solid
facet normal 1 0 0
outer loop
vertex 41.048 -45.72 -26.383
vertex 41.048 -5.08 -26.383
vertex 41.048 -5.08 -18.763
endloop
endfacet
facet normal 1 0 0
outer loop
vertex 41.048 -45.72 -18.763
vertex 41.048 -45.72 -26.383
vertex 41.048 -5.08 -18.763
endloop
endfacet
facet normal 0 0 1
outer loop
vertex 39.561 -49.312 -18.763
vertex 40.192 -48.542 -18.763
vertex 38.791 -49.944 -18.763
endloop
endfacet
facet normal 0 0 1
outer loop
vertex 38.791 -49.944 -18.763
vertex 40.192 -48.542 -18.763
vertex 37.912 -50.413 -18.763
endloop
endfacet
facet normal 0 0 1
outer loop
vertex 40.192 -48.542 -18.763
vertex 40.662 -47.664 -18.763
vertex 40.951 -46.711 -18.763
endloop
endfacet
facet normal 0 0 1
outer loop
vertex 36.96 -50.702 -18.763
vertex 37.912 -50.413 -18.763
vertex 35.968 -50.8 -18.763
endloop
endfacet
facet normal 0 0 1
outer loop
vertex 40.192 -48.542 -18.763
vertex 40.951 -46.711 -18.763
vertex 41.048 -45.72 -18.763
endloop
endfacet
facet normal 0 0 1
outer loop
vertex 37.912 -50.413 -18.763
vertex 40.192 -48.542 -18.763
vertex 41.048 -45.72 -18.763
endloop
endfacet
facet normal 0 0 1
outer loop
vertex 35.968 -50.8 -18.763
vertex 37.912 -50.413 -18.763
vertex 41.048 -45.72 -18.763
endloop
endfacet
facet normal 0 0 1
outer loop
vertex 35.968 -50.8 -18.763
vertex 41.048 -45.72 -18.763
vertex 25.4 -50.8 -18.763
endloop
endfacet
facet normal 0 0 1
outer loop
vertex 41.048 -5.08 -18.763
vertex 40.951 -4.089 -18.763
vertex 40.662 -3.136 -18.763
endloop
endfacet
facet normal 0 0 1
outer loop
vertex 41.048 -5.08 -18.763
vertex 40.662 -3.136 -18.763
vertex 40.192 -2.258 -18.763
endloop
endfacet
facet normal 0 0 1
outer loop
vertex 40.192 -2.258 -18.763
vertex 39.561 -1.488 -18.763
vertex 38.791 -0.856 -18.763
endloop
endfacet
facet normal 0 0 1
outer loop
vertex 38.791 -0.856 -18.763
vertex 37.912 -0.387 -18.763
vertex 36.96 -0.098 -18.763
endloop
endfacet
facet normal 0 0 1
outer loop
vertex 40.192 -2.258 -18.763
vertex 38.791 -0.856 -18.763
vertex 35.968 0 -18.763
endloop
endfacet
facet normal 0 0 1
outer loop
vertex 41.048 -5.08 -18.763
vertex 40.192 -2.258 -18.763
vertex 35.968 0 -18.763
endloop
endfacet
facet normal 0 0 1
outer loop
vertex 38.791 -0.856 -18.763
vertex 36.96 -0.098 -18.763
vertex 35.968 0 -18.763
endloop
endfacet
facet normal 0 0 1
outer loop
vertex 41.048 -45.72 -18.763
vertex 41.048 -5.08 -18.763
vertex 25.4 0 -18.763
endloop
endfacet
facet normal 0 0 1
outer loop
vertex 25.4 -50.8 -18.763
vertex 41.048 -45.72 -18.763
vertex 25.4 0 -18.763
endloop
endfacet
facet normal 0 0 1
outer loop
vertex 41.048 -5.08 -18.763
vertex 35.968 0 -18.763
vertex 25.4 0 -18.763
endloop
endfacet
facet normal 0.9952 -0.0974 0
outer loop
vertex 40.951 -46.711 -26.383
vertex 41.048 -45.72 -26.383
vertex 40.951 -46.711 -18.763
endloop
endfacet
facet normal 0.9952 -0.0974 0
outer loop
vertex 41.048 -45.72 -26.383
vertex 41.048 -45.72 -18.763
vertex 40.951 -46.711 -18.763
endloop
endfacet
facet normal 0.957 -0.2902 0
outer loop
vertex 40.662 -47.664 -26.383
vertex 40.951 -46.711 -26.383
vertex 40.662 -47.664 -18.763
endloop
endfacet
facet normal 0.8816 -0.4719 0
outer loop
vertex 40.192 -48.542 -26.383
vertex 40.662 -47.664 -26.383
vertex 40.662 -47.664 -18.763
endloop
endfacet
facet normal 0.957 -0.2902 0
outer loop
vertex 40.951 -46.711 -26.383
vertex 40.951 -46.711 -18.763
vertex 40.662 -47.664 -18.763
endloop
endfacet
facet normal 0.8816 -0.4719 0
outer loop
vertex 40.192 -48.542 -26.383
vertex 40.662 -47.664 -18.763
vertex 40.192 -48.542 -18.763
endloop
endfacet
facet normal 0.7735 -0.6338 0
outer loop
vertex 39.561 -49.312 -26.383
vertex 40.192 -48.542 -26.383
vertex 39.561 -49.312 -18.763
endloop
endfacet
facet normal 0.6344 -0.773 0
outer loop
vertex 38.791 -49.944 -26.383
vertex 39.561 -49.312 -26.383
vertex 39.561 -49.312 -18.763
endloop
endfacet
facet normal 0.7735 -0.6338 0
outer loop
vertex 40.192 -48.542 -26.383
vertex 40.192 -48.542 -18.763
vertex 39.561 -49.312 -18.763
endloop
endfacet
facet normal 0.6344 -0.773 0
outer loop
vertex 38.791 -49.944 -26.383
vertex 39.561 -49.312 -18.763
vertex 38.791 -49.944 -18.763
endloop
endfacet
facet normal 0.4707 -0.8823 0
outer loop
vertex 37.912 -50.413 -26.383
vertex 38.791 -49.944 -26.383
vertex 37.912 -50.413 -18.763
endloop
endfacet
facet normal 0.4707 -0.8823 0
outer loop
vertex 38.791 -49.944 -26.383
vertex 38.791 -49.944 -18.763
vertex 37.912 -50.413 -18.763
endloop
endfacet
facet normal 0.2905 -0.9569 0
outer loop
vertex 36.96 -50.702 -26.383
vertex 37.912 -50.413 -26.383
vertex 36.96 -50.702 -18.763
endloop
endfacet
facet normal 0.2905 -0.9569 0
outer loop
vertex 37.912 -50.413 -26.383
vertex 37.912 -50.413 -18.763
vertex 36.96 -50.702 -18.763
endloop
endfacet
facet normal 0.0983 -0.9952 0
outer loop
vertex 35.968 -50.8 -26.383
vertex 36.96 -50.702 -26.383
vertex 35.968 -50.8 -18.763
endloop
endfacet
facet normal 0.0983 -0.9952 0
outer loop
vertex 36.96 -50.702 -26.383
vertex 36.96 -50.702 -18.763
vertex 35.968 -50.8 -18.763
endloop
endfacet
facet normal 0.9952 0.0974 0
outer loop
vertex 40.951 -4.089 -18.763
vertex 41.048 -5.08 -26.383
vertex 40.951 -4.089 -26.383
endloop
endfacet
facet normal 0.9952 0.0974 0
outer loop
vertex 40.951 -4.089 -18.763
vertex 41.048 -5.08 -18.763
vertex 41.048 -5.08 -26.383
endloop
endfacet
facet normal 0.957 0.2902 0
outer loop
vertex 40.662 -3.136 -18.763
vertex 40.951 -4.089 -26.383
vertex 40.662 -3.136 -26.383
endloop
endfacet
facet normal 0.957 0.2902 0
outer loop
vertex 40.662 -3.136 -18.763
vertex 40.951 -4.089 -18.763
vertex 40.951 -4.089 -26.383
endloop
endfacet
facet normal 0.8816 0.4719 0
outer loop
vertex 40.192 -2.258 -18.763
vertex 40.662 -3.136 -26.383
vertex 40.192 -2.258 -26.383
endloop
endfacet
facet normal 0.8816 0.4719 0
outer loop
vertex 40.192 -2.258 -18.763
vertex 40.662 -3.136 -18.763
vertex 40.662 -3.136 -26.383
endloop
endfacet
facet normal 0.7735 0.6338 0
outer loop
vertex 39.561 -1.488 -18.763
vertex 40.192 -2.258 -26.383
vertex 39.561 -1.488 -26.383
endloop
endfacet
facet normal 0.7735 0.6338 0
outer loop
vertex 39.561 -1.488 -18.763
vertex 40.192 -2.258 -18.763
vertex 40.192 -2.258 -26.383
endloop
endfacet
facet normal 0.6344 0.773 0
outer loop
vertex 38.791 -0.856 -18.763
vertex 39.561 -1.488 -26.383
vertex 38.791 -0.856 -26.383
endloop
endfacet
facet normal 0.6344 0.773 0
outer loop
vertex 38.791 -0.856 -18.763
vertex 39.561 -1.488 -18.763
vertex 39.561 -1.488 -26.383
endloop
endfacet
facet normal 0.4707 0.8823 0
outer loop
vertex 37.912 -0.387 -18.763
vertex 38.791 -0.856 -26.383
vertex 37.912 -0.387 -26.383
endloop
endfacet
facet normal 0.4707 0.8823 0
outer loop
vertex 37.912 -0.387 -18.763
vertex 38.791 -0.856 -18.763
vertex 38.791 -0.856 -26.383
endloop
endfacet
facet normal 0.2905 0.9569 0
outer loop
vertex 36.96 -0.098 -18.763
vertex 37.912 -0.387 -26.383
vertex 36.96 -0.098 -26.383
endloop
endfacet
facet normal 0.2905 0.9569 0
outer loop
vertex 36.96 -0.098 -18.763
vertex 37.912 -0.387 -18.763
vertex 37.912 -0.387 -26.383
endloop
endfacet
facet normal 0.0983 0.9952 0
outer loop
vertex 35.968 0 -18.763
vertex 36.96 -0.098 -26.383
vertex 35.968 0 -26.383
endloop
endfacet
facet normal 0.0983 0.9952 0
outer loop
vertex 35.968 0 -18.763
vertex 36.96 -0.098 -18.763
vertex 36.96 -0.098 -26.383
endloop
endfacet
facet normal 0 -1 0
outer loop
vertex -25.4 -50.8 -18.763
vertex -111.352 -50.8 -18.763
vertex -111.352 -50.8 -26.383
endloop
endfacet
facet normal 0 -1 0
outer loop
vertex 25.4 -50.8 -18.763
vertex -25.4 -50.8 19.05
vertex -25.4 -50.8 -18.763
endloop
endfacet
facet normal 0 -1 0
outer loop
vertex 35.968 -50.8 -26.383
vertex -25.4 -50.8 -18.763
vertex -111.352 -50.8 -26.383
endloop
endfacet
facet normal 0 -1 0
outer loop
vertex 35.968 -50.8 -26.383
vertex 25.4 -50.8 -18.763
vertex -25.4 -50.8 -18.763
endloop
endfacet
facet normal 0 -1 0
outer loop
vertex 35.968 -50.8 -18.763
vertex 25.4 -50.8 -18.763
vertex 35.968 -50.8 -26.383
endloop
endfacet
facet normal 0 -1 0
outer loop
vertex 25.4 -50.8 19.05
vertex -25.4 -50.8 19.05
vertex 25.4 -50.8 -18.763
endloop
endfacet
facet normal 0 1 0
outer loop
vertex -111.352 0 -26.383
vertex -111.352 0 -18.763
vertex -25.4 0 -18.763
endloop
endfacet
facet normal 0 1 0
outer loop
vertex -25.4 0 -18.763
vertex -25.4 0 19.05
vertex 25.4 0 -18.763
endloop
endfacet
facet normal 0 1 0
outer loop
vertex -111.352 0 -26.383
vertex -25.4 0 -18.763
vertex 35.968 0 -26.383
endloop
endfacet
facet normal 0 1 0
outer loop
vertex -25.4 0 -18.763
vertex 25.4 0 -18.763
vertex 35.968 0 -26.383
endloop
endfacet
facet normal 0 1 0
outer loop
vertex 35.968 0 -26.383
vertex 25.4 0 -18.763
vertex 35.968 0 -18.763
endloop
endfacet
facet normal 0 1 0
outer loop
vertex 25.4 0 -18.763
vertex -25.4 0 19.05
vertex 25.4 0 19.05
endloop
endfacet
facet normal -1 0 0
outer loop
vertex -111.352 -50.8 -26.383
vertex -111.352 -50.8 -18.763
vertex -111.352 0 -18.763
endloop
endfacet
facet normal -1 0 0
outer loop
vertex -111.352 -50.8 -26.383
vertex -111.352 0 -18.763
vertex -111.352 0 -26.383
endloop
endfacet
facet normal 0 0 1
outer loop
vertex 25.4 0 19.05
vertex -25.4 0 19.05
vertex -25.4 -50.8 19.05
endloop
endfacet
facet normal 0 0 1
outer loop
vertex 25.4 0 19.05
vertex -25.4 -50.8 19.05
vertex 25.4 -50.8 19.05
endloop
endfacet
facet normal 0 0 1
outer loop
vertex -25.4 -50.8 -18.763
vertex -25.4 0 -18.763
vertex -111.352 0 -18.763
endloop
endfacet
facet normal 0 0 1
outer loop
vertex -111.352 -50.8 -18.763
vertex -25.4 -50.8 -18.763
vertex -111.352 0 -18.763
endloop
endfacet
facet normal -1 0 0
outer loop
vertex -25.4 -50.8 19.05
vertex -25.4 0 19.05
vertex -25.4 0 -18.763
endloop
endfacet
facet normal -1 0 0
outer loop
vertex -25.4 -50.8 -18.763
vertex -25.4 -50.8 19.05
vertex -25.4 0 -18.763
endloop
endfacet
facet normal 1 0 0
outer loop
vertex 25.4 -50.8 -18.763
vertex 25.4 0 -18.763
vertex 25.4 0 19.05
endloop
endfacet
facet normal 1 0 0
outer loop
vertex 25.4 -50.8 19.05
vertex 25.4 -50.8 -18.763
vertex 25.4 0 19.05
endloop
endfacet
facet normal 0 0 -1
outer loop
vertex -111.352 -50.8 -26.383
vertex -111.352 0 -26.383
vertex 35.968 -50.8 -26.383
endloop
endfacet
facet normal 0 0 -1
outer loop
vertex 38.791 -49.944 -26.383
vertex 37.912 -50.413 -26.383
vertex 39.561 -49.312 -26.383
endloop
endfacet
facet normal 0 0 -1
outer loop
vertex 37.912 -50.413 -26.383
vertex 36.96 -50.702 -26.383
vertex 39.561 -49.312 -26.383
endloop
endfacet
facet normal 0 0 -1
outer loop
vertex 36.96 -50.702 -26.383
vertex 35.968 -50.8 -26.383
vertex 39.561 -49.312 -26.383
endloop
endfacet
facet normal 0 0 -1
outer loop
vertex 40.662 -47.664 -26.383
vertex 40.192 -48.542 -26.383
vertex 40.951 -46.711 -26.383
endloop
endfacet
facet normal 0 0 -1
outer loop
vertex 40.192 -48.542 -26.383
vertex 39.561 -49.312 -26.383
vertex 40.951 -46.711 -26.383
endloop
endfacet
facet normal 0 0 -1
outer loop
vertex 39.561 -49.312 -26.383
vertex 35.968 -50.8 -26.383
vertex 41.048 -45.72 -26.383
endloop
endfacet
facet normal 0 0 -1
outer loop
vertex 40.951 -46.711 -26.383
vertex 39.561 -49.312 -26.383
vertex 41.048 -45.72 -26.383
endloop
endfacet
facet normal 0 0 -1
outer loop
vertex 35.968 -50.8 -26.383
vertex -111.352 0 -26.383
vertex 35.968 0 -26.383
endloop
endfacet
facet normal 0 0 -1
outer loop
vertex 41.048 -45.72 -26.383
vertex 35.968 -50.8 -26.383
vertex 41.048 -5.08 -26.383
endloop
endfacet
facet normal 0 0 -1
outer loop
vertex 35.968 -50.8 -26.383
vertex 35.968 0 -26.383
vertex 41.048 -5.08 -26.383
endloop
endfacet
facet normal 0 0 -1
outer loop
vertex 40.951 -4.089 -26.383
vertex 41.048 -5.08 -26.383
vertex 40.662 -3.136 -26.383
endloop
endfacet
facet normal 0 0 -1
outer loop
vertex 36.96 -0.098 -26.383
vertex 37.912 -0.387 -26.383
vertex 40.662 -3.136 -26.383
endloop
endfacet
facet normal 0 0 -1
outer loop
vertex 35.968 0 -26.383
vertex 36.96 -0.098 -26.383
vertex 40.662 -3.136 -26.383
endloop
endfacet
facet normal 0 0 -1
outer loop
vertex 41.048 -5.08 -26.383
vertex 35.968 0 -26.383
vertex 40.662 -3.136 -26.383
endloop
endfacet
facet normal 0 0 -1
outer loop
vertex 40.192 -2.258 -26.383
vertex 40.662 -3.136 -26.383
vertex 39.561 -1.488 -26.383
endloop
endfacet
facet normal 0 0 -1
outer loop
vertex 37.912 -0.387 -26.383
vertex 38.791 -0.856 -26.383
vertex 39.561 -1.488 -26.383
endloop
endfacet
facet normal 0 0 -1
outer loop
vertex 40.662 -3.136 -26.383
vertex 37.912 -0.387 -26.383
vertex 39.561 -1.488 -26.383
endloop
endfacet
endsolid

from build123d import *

# Parameters (mm, degrees)
F0_W     = 50.8
F0_H     = 37.8133962381
F0_H_2   = 0.2866037619
F1_DEPTH = 50.8
F2_R     = 5.08


with BuildPart() as f1:
    # F0 (on Front) → F1 (new body)
    with BuildSketch(Plane.XZ):
        with Locations((0, 0.143301881)):
            Rectangle(F0_W, F0_H)
        with Locations((0, -18.906698119)):
            Rectangle(F0_W, F0_H_2)
        Polygon((-25.4, -19.05), (-25.4, -18.7633962381), (-111.351557076, -18.7633962381), (-111.351557076, -26.3833962381), (41.048442924, -26.3833962381), (41.048442924, -18.7633962381), (25.4, -18.7633962381), (25.4, -19.05), align=None)
    extrude(amount=F1_DEPTH)

    # F2
    f2_edges = [f1.edges().sort_by_distance(p)[0] for p in [
        (41.048443, 0, -22.573396),
        (41.048443, -50.8, -22.573396),
    ]]
    fillet(f2_edges, radius=F2_R)


solid = f1.part
